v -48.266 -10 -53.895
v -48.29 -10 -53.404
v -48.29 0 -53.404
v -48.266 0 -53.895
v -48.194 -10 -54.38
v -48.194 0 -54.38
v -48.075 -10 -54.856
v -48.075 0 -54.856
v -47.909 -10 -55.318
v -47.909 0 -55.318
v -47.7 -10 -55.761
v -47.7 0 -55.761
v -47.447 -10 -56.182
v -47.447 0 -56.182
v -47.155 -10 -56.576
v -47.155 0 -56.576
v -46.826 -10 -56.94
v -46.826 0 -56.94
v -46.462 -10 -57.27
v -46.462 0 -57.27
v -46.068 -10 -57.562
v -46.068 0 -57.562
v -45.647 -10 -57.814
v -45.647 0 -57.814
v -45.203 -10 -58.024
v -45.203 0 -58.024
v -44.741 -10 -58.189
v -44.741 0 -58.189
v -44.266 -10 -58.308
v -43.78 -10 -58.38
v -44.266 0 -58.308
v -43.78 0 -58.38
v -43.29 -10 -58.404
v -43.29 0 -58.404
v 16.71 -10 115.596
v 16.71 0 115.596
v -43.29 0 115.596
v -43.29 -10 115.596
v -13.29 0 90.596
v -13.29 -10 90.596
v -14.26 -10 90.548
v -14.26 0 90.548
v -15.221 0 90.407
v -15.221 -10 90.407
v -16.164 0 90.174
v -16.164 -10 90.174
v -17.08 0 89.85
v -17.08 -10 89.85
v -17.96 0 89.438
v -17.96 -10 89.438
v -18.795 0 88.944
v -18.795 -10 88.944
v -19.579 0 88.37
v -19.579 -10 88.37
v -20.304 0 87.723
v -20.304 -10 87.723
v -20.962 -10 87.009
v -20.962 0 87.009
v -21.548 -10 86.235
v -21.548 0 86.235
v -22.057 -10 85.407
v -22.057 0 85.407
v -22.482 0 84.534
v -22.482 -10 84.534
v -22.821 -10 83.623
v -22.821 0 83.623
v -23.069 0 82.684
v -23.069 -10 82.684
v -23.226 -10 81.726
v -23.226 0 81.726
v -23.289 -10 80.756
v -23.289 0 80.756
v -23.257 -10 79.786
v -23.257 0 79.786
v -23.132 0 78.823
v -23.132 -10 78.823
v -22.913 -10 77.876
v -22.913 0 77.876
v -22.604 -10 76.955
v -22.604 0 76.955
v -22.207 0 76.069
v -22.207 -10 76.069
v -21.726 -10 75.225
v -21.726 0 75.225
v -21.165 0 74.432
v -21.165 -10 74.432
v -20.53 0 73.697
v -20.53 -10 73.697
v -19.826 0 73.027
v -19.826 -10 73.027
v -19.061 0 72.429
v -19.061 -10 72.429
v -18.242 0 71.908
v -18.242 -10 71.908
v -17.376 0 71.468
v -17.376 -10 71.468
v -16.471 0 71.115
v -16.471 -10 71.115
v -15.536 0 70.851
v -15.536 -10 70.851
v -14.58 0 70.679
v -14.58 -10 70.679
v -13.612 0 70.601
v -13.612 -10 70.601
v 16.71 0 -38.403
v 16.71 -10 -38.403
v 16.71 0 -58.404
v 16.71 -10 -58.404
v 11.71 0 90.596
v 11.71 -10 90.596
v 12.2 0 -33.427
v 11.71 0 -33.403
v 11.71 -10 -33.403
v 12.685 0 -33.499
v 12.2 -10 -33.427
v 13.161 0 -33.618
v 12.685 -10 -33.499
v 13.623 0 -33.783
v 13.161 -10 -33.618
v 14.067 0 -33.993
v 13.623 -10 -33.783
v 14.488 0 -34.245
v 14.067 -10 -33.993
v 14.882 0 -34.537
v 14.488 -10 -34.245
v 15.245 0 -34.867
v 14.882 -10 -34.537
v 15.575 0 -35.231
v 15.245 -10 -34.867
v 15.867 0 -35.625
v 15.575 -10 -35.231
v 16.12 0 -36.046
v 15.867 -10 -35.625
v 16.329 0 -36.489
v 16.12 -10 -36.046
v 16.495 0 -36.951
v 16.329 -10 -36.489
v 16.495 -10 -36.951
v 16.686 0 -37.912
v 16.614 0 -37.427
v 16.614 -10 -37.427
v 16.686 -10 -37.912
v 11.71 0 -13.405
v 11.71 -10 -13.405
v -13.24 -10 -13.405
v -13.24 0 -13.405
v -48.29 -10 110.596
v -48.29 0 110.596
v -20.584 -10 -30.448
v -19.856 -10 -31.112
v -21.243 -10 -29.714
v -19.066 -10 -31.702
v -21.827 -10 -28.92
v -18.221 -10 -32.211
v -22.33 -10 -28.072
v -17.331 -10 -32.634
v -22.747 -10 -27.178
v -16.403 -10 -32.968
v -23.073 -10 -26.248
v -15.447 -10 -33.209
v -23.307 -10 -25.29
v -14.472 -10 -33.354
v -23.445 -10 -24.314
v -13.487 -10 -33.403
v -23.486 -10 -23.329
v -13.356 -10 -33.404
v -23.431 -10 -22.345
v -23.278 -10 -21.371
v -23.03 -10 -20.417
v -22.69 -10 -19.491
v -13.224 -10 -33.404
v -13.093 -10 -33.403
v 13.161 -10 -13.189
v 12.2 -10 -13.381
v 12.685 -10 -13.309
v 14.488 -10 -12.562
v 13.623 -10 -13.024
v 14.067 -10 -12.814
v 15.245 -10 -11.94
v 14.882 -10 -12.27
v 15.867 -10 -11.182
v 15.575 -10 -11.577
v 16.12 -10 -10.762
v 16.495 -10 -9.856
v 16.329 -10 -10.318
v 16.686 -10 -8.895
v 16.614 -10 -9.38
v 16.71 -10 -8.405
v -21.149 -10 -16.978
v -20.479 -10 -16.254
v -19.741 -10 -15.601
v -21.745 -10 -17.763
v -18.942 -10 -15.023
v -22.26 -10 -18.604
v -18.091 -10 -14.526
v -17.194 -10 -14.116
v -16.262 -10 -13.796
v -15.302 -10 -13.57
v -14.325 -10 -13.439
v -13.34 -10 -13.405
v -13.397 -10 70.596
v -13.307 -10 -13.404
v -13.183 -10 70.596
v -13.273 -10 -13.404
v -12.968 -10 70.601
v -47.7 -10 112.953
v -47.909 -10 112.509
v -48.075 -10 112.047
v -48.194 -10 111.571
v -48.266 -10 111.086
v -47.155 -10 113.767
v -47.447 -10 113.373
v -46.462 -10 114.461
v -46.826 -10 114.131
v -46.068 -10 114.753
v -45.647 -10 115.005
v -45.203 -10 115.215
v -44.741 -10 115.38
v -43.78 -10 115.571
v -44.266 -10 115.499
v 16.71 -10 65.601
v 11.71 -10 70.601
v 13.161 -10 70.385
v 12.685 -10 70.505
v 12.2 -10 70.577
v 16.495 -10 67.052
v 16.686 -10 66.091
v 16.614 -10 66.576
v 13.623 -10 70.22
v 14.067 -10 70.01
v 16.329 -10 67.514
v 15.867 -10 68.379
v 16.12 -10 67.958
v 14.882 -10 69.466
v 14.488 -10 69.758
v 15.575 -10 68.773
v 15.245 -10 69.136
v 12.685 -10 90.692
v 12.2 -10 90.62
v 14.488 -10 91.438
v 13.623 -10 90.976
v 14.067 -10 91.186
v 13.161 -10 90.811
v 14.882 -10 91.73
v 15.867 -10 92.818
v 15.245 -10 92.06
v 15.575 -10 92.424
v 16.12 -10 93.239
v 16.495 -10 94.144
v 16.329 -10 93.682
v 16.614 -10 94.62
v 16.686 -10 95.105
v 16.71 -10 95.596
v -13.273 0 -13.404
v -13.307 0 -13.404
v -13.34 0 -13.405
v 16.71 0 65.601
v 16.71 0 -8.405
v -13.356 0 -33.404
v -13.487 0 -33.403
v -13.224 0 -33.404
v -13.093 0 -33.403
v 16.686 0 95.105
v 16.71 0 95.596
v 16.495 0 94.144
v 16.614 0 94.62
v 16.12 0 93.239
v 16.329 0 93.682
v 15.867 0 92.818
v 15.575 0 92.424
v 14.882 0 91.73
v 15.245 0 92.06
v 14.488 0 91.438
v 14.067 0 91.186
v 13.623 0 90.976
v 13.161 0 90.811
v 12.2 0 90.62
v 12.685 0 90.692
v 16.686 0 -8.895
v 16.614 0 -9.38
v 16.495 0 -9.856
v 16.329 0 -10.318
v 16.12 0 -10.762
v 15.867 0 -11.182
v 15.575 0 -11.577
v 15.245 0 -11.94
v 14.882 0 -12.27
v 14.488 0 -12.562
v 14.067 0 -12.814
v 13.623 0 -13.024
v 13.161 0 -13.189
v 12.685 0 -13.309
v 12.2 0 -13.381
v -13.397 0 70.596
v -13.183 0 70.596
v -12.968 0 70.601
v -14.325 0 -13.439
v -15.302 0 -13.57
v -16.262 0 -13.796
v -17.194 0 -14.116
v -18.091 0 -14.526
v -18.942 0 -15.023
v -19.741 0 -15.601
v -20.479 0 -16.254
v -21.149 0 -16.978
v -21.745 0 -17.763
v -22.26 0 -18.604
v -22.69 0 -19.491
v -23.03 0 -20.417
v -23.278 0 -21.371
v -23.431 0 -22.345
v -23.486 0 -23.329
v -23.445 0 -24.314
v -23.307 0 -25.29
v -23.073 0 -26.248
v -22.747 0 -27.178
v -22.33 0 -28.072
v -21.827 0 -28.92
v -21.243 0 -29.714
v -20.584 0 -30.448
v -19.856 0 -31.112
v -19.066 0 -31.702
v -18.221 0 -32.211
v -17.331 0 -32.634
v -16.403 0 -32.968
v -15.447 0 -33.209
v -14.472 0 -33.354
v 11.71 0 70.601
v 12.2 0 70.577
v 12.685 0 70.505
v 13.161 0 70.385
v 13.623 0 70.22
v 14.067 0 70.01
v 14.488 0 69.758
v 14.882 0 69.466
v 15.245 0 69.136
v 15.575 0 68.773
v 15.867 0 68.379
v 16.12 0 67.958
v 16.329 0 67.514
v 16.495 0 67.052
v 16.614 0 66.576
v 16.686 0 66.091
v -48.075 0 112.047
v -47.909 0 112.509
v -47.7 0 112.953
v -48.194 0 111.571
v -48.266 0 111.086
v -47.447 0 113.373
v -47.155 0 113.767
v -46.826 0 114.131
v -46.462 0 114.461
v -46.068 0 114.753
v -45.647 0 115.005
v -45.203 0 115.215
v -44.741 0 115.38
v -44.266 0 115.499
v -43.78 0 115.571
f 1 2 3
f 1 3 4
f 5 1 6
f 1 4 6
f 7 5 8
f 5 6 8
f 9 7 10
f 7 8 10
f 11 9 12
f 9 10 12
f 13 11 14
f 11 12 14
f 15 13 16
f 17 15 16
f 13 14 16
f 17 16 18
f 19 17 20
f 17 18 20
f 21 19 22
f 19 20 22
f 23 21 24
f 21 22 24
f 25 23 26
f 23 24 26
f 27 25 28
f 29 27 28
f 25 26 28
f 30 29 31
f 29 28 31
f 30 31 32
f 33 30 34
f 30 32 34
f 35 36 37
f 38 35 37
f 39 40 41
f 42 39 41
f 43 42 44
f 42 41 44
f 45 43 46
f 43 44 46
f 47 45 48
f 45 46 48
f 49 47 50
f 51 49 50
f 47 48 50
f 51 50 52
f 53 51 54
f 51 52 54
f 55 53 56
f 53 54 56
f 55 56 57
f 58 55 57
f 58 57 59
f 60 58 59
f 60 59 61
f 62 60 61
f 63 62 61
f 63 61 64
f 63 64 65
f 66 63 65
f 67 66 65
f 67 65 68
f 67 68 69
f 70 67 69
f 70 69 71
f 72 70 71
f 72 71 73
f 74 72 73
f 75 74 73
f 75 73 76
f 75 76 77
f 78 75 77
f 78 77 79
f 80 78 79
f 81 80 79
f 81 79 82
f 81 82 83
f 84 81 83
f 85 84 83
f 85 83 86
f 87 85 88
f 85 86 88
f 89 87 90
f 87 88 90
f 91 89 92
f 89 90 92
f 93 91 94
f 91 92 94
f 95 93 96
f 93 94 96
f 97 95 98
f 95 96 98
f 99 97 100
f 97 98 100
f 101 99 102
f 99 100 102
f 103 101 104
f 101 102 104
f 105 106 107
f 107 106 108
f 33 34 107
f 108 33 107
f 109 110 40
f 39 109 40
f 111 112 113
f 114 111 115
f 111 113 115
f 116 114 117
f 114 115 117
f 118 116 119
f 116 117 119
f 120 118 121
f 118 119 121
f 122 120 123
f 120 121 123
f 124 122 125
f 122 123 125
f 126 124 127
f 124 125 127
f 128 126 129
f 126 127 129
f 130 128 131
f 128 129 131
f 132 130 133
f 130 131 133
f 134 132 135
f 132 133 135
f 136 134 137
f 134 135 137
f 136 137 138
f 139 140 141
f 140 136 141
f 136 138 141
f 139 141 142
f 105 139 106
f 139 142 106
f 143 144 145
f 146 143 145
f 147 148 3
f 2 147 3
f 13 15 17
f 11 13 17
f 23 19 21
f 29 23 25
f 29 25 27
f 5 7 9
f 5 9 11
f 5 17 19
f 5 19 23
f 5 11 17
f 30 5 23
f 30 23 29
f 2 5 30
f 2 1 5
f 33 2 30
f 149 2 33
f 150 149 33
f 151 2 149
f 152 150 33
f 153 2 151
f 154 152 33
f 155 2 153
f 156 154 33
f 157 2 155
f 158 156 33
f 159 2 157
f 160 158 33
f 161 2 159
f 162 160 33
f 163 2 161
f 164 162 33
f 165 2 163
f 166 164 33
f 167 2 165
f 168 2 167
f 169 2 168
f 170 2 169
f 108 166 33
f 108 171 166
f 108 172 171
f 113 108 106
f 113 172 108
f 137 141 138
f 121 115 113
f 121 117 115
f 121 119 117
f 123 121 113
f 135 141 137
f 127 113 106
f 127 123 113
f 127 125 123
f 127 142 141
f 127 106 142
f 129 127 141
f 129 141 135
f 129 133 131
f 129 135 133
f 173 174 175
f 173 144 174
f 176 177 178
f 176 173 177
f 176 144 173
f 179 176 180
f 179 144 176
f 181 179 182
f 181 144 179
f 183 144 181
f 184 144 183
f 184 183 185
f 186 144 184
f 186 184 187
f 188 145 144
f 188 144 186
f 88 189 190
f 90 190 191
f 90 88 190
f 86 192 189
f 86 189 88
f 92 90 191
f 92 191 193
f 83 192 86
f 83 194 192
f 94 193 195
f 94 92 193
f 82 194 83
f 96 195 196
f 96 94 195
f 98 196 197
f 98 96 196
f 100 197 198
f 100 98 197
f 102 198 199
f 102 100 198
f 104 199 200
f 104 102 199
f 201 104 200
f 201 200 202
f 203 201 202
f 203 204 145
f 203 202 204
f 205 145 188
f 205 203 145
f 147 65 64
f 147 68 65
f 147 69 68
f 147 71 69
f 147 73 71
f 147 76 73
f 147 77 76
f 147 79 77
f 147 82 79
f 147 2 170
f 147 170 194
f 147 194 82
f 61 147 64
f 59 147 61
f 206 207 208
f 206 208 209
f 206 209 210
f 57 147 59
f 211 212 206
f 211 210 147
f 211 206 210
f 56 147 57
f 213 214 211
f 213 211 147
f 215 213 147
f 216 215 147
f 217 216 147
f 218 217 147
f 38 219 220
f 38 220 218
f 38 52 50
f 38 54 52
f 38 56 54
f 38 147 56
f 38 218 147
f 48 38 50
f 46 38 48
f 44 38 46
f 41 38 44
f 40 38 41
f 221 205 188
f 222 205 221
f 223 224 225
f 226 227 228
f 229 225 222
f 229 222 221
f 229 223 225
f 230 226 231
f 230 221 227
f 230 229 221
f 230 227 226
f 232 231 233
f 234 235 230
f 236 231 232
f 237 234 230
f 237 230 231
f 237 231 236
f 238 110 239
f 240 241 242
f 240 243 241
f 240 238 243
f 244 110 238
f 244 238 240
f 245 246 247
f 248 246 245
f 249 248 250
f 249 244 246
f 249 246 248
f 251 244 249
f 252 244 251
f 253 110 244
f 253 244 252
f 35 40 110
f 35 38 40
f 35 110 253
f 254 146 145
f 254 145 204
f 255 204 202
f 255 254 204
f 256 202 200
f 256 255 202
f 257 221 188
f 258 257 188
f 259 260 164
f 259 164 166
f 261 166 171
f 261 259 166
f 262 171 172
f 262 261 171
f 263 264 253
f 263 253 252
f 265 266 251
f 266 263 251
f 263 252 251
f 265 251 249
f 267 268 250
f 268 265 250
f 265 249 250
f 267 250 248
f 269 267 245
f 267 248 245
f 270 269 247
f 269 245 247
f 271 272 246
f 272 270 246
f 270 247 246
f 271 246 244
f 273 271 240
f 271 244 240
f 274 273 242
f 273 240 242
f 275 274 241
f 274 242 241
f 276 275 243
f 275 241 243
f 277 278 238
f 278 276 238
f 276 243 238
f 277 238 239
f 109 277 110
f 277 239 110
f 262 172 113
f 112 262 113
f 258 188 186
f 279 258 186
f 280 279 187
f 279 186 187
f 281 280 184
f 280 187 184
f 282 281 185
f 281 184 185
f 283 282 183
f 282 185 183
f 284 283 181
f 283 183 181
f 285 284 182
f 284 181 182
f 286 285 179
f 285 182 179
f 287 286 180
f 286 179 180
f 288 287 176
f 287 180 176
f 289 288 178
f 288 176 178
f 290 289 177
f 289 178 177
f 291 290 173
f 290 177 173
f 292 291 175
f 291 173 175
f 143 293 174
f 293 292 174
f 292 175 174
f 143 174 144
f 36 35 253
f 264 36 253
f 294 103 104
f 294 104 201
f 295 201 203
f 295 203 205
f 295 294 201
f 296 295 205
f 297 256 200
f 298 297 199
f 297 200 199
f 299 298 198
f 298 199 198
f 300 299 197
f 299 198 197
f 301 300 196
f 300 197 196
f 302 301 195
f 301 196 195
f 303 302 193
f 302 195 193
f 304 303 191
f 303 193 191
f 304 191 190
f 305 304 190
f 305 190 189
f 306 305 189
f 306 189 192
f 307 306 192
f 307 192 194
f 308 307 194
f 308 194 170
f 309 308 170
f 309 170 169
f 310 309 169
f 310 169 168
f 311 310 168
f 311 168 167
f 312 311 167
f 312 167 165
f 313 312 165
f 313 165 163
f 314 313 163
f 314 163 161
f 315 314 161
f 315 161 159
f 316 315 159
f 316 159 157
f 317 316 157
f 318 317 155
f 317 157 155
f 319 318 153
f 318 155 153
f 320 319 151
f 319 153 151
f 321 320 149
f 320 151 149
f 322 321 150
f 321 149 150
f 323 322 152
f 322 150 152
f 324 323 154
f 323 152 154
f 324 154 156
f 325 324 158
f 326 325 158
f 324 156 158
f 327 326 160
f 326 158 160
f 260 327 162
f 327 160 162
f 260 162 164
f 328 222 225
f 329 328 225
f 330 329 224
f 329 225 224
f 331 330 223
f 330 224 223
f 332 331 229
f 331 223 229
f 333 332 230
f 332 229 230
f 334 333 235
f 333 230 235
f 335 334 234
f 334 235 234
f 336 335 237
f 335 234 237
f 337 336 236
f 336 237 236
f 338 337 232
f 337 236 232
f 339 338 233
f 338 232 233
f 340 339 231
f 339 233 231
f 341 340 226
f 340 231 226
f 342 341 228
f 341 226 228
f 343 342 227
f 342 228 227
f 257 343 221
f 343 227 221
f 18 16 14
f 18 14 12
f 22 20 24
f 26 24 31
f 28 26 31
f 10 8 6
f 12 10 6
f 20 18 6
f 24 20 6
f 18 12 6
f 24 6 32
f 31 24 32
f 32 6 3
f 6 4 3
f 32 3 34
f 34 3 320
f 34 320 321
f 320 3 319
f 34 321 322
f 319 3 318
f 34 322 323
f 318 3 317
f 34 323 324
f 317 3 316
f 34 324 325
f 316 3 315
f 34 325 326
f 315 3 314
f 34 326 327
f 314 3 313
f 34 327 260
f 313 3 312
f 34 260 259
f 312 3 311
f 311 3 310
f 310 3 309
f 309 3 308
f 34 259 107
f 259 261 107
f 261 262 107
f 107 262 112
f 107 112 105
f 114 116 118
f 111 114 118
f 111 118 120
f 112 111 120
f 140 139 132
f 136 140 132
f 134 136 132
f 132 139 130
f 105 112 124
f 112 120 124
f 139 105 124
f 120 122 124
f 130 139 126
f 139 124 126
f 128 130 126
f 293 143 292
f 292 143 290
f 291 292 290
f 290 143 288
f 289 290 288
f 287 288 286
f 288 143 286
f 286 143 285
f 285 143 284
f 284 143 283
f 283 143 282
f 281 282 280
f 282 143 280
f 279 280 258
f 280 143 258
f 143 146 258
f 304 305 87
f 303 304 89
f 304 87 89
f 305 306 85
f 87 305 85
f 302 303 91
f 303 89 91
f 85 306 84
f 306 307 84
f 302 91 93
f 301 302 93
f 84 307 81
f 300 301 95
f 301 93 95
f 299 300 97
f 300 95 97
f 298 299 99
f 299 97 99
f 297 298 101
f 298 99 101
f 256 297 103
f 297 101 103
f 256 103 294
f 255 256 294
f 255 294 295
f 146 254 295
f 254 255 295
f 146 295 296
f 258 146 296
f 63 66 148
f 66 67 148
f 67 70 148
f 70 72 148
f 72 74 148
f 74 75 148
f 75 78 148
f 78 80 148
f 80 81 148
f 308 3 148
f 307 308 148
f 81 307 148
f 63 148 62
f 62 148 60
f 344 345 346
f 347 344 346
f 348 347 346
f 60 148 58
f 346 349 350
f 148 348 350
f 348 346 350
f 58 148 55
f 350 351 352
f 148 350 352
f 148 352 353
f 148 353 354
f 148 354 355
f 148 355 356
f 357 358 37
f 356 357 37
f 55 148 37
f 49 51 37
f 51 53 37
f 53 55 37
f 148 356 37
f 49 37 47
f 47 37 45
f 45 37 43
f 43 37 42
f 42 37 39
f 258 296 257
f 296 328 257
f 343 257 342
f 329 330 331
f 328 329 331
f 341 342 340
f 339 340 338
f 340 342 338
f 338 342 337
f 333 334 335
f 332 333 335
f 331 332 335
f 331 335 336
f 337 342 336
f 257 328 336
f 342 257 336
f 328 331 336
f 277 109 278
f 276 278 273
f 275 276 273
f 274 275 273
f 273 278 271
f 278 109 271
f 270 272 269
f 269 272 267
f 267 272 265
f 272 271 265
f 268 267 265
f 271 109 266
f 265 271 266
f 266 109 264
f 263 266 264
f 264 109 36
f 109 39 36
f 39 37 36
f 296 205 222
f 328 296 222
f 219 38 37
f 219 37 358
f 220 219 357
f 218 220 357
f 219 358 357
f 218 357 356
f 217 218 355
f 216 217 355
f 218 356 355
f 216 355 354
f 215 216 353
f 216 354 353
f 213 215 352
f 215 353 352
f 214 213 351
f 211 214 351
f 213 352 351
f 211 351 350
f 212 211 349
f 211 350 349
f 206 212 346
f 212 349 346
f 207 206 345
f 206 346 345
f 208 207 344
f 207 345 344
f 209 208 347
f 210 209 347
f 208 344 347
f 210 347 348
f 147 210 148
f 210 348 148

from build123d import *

# Parameters (mm, degrees)
F0_R     = 10
F1_DEPTH = 10
F3_DEPTH = 25


with BuildPart() as f1:
    # F0 (on Front) → F1 (new body)
    with BuildSketch(Plane.XZ):
        with BuildLine():
            Line((96.709934, 115.595525), (-43.290066, 115.595525))
            ThreePointArc((-43.290066, 115.595525), (-46.8256, 114.131058), (-48.290066, 110.595525))
            Line((-48.290066, 110.595525), (-48.290066, -53.404475))
            ThreePointArc((-48.290066, -53.404475), (-46.8256, -56.940009), (-43.290066, -58.404475))
            Line((-43.290066, -58.404475), (96.709934, -58.404475))
            ThreePointArc((96.709934, -58.404475), (100.245467, -56.940009), (101.709934, -53.404475))
            Line((101.709934, -53.404475), (101.709934, 110.595525))
            ThreePointArc((101.709934, 110.595525), (100.245467, 114.131058), (96.709934, 115.595525))
        make_face()
        with Locations((-13.290066, -23.404475)):
            Circle(F0_R, mode=Mode.SUBTRACT)
        with Locations((66.709934, -23.404475)):
            Circle(F0_R, mode=Mode.SUBTRACT)
        with Locations((-13.290066, 80.595525)):
            Circle(F0_R, mode=Mode.SUBTRACT)
        with Locations((66.709934, 80.595525)):
            Circle(F0_R, mode=Mode.SUBTRACT)
    extrude(amount=F1_DEPTH)

    # F2 (on face) → F3 (cut)
    with BuildSketch(Plane.XZ.offset(10)):
        with BuildLine():
            Line((128.527537, 115.595525), (16.709934, 115.595525))
            Line((16.709934, 115.595525), (16.709934, 95.595525))
            ThreePointArc((16.709934, 95.595525), (15.245467, 92.059991), (11.709934, 90.595525))
            Line((11.709934, 90.595525), (-13.290066, 90.595525))
            ThreePointArc((-13.290066, 90.595525), (-23.288771, 80.756455), (-13.611886, 70.600704))
            Line((-13.611886, 70.600704), (11.709934, 70.600704))
            ThreePointArc((11.709934, 70.600704), (15.245467, 69.136238), (16.709934, 65.600704))
            Line((16.709934, 65.600704), (16.709934, -8.404598))
            ThreePointArc((16.709934, -8.404598), (15.245467, -11.940131), (11.709934, -13.404598))
            Line((11.709934, -13.404598), (-13.339475, -13.404598))
            ThreePointArc((-13.339475, -13.404598), (-23.48642, -23.329165), (-13.48718, -33.402533))
            Line((-13.48718, -33.402533), (11.709934, -33.402533))
            ThreePointArc((11.709934, -33.402533), (15.245467, -34.866999), (16.709934, -38.402533))
            Line((16.709934, -38.402533), (16.709934, -58.404475))
            Line((16.709934, -58.404475), (128.527537, -58.404475))
            Line((128.527537, -58.404475), (128.527537, 115.595525))
        make_face()
    extrude(amount=-F3_DEPTH, mode=Mode.SUBTRACT)


solid = f1.part
